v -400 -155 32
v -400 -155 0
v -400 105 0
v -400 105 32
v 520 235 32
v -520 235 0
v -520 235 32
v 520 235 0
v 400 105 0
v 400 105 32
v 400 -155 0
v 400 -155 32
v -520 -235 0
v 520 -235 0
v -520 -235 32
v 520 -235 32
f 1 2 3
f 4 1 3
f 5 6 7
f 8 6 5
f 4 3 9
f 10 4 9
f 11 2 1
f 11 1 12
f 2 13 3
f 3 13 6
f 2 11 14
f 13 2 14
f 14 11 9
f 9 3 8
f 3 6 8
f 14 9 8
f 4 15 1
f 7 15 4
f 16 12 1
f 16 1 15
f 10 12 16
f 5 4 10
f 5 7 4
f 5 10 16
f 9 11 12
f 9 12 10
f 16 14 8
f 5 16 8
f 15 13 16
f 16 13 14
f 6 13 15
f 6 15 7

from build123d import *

# Parameters (mm, degrees)
F0_W     = 1040
F0_H     = 470
F1_DEPTH = 32
F2_W     = 800
F2_H     = 260
F3_DEPTH = 32.001


with BuildPart() as f1:
    # F0 (on Top) → F1 (new body)
    with BuildSketch(Plane.XY):
        Rectangle(F0_W, F0_H)
    extrude(amount=F1_DEPTH)

    # F2 (on Top) → F3 (cut, through all)
    with BuildSketch(Plane.XY):
        with Locations((0, -25)):
            Rectangle(F2_W, F2_H)
    extrude(amount=F3_DEPTH, mode=Mode.SUBTRACT)


solid = f1.part
